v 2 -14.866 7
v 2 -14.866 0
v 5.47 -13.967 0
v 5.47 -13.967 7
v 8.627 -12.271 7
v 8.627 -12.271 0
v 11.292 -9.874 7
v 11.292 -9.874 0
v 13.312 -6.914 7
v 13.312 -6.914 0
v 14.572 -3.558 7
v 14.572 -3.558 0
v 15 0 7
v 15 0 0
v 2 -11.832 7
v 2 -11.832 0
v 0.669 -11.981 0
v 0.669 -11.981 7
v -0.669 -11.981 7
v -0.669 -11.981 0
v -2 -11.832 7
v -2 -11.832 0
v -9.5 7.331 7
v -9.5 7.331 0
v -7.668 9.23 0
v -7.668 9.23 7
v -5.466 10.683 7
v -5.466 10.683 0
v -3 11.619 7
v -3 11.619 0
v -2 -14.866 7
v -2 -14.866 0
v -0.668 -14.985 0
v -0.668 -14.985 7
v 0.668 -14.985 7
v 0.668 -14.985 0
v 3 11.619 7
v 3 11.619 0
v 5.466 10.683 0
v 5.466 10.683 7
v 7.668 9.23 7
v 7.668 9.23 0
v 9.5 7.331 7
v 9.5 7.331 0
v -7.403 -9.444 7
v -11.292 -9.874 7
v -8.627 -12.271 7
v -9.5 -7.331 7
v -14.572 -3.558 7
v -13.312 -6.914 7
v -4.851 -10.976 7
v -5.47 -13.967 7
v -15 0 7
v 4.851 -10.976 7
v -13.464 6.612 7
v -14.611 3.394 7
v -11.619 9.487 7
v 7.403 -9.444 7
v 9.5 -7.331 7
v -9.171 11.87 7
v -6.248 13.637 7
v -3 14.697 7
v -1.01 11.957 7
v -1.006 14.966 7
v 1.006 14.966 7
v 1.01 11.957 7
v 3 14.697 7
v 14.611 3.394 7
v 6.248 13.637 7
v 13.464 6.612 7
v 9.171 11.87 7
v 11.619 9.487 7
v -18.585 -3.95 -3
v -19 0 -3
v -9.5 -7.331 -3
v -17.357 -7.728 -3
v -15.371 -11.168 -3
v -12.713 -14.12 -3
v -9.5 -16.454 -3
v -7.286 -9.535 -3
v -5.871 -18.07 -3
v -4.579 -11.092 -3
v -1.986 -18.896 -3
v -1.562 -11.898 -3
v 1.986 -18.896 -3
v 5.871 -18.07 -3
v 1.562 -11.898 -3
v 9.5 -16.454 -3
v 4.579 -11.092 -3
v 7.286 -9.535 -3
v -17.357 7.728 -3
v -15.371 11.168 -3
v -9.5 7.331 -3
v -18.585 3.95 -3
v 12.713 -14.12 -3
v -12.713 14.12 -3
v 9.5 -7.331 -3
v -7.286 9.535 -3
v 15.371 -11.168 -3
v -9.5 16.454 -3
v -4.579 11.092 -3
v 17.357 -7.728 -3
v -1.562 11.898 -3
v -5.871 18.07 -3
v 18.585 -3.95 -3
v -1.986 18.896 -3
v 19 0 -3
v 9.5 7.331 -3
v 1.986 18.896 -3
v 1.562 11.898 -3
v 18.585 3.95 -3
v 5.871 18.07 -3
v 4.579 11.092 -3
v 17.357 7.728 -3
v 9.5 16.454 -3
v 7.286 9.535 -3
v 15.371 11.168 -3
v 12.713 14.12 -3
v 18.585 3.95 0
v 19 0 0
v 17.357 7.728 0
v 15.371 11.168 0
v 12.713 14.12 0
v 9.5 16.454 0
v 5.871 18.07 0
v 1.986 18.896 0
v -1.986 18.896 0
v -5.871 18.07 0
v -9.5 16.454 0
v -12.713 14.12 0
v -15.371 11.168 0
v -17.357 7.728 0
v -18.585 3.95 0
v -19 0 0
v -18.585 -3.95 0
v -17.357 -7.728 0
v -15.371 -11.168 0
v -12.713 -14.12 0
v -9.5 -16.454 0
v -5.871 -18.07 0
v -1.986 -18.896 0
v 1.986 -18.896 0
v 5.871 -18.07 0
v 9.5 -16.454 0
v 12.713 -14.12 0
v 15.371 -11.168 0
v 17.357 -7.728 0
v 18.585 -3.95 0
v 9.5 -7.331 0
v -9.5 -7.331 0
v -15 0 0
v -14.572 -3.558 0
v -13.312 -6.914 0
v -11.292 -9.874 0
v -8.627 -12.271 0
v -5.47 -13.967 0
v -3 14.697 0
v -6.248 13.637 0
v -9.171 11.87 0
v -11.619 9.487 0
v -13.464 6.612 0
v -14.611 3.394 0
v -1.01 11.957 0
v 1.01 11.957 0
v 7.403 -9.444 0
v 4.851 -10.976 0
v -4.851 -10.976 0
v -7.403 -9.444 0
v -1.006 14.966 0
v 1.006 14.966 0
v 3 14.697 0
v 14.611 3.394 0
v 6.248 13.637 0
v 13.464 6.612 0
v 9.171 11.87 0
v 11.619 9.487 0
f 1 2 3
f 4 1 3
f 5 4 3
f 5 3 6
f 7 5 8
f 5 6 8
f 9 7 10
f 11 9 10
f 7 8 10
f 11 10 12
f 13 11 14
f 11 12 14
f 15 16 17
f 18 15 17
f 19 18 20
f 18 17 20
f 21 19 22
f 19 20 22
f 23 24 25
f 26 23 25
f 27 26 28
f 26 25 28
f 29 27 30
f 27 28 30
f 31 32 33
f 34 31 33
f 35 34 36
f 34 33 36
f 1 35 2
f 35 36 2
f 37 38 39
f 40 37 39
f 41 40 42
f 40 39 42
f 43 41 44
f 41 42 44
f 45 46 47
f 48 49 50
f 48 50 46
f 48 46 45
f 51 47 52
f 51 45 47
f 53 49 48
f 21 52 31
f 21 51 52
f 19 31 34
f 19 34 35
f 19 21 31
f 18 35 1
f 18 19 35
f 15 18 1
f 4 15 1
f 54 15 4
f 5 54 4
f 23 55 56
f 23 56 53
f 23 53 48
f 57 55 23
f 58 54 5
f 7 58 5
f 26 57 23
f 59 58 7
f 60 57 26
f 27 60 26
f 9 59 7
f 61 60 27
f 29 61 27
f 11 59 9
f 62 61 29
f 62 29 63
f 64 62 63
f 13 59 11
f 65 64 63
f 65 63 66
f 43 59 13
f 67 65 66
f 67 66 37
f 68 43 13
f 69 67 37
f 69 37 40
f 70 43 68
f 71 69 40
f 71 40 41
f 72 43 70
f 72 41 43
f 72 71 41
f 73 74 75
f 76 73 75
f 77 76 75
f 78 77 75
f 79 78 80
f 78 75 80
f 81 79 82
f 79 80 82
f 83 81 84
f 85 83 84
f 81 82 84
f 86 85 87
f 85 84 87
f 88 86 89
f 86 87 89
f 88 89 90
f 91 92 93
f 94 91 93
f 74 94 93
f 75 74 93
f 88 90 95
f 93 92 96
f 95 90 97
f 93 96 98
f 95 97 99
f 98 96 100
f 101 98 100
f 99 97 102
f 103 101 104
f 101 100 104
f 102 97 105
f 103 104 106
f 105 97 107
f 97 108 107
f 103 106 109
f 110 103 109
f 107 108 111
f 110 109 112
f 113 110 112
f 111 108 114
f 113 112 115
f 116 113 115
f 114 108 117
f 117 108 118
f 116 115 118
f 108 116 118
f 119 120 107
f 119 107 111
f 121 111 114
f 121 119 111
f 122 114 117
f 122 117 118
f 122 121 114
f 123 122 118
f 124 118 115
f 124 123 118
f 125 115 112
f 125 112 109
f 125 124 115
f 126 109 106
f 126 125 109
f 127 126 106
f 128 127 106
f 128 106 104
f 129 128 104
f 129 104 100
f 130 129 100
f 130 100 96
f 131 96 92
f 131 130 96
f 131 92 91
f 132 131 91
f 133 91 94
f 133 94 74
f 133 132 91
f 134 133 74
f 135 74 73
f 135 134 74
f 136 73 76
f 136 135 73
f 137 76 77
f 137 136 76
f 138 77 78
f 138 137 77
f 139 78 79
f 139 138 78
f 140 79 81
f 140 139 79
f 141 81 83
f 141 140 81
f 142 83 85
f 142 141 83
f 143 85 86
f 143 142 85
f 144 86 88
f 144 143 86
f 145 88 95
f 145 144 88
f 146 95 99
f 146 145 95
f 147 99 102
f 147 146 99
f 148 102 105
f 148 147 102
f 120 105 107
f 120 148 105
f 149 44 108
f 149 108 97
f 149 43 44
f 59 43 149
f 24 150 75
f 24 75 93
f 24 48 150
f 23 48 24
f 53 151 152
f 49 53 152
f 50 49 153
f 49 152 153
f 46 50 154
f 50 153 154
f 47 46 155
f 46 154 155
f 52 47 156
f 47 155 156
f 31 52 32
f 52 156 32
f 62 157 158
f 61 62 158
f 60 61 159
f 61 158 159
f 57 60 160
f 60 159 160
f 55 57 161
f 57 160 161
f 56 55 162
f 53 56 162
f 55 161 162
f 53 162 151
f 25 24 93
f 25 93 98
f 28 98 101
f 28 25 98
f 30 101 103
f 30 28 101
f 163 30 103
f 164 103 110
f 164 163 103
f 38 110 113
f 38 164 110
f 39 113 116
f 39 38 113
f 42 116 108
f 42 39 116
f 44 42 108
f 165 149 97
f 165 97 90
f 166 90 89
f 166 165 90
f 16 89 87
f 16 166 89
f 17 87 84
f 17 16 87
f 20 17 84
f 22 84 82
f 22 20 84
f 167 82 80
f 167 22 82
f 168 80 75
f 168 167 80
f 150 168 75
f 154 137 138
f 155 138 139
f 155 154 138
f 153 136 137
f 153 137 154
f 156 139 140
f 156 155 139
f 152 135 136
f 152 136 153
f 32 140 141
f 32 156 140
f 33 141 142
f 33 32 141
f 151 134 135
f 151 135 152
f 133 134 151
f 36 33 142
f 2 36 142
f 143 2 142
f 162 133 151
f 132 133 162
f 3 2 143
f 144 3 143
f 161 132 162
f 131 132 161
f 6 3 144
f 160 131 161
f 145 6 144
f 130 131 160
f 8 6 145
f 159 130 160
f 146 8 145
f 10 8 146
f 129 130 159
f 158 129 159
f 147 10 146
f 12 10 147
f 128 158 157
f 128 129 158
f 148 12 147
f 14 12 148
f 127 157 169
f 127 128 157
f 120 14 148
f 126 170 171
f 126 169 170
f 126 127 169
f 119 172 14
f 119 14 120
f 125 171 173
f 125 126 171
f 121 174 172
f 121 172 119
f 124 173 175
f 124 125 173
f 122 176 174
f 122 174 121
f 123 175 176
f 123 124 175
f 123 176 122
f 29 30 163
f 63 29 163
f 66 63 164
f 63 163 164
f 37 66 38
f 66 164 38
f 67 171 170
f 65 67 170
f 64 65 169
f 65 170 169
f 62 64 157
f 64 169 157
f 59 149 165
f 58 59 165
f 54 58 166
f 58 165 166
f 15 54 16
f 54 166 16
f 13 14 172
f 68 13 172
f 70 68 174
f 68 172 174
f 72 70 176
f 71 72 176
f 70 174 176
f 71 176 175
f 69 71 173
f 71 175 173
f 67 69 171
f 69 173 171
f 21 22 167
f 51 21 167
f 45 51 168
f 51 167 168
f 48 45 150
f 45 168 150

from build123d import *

# Parameters (mm, degrees)
ESQUISSE1_R        = 15
BOSS_EXTRU_1_DEPTH = 7
BOSS_EXTRU_2_START = -3
ESQUISSE1_4_R      = 19
BOSS_EXTRU_2_DEPTH = 3


with BuildPart() as part:
    # Esquisse1 → Boss.-Extru.1 (new body)
    with BuildSketch(Plane.XY):
        Circle(ESQUISSE1_R)
        with BuildLine():
            Line((9.5, 7.331439149), (9.5, -7.331439149))
            ThreePointArc((9.5, -7.331439149), (0, -12), (-9.5, -7.331439149))
            Line((-9.5, -7.331439149), (-9.5, 7.331439149))
            ThreePointArc((-9.5, 7.331439149), (0, 12), (9.5, 7.331439149))
        make_face(mode=Mode.SUBTRACT)
    extrude(amount=BOSS_EXTRU_1_DEPTH)

    # Esquisse1<4> → Boss.-Extru.2 (add)
    with BuildSketch(Plane.XY.offset(BOSS_EXTRU_2_START)):
        Circle(ESQUISSE1_4_R)
        with BuildLine():
            Line((9.5, 7.331439149), (9.5, -7.331439149))
            ThreePointArc((9.5, -7.331439149), (0, -12), (-9.5, -7.331439149))
            Line((-9.5, -7.331439149), (-9.5, 7.331439149))
            ThreePointArc((-9.5, 7.331439149), (0, 12), (9.5, 7.331439149))
        make_face(mode=Mode.SUBTRACT)
    extrude(amount=BOSS_EXTRU_2_DEPTH)


solid = part.part
